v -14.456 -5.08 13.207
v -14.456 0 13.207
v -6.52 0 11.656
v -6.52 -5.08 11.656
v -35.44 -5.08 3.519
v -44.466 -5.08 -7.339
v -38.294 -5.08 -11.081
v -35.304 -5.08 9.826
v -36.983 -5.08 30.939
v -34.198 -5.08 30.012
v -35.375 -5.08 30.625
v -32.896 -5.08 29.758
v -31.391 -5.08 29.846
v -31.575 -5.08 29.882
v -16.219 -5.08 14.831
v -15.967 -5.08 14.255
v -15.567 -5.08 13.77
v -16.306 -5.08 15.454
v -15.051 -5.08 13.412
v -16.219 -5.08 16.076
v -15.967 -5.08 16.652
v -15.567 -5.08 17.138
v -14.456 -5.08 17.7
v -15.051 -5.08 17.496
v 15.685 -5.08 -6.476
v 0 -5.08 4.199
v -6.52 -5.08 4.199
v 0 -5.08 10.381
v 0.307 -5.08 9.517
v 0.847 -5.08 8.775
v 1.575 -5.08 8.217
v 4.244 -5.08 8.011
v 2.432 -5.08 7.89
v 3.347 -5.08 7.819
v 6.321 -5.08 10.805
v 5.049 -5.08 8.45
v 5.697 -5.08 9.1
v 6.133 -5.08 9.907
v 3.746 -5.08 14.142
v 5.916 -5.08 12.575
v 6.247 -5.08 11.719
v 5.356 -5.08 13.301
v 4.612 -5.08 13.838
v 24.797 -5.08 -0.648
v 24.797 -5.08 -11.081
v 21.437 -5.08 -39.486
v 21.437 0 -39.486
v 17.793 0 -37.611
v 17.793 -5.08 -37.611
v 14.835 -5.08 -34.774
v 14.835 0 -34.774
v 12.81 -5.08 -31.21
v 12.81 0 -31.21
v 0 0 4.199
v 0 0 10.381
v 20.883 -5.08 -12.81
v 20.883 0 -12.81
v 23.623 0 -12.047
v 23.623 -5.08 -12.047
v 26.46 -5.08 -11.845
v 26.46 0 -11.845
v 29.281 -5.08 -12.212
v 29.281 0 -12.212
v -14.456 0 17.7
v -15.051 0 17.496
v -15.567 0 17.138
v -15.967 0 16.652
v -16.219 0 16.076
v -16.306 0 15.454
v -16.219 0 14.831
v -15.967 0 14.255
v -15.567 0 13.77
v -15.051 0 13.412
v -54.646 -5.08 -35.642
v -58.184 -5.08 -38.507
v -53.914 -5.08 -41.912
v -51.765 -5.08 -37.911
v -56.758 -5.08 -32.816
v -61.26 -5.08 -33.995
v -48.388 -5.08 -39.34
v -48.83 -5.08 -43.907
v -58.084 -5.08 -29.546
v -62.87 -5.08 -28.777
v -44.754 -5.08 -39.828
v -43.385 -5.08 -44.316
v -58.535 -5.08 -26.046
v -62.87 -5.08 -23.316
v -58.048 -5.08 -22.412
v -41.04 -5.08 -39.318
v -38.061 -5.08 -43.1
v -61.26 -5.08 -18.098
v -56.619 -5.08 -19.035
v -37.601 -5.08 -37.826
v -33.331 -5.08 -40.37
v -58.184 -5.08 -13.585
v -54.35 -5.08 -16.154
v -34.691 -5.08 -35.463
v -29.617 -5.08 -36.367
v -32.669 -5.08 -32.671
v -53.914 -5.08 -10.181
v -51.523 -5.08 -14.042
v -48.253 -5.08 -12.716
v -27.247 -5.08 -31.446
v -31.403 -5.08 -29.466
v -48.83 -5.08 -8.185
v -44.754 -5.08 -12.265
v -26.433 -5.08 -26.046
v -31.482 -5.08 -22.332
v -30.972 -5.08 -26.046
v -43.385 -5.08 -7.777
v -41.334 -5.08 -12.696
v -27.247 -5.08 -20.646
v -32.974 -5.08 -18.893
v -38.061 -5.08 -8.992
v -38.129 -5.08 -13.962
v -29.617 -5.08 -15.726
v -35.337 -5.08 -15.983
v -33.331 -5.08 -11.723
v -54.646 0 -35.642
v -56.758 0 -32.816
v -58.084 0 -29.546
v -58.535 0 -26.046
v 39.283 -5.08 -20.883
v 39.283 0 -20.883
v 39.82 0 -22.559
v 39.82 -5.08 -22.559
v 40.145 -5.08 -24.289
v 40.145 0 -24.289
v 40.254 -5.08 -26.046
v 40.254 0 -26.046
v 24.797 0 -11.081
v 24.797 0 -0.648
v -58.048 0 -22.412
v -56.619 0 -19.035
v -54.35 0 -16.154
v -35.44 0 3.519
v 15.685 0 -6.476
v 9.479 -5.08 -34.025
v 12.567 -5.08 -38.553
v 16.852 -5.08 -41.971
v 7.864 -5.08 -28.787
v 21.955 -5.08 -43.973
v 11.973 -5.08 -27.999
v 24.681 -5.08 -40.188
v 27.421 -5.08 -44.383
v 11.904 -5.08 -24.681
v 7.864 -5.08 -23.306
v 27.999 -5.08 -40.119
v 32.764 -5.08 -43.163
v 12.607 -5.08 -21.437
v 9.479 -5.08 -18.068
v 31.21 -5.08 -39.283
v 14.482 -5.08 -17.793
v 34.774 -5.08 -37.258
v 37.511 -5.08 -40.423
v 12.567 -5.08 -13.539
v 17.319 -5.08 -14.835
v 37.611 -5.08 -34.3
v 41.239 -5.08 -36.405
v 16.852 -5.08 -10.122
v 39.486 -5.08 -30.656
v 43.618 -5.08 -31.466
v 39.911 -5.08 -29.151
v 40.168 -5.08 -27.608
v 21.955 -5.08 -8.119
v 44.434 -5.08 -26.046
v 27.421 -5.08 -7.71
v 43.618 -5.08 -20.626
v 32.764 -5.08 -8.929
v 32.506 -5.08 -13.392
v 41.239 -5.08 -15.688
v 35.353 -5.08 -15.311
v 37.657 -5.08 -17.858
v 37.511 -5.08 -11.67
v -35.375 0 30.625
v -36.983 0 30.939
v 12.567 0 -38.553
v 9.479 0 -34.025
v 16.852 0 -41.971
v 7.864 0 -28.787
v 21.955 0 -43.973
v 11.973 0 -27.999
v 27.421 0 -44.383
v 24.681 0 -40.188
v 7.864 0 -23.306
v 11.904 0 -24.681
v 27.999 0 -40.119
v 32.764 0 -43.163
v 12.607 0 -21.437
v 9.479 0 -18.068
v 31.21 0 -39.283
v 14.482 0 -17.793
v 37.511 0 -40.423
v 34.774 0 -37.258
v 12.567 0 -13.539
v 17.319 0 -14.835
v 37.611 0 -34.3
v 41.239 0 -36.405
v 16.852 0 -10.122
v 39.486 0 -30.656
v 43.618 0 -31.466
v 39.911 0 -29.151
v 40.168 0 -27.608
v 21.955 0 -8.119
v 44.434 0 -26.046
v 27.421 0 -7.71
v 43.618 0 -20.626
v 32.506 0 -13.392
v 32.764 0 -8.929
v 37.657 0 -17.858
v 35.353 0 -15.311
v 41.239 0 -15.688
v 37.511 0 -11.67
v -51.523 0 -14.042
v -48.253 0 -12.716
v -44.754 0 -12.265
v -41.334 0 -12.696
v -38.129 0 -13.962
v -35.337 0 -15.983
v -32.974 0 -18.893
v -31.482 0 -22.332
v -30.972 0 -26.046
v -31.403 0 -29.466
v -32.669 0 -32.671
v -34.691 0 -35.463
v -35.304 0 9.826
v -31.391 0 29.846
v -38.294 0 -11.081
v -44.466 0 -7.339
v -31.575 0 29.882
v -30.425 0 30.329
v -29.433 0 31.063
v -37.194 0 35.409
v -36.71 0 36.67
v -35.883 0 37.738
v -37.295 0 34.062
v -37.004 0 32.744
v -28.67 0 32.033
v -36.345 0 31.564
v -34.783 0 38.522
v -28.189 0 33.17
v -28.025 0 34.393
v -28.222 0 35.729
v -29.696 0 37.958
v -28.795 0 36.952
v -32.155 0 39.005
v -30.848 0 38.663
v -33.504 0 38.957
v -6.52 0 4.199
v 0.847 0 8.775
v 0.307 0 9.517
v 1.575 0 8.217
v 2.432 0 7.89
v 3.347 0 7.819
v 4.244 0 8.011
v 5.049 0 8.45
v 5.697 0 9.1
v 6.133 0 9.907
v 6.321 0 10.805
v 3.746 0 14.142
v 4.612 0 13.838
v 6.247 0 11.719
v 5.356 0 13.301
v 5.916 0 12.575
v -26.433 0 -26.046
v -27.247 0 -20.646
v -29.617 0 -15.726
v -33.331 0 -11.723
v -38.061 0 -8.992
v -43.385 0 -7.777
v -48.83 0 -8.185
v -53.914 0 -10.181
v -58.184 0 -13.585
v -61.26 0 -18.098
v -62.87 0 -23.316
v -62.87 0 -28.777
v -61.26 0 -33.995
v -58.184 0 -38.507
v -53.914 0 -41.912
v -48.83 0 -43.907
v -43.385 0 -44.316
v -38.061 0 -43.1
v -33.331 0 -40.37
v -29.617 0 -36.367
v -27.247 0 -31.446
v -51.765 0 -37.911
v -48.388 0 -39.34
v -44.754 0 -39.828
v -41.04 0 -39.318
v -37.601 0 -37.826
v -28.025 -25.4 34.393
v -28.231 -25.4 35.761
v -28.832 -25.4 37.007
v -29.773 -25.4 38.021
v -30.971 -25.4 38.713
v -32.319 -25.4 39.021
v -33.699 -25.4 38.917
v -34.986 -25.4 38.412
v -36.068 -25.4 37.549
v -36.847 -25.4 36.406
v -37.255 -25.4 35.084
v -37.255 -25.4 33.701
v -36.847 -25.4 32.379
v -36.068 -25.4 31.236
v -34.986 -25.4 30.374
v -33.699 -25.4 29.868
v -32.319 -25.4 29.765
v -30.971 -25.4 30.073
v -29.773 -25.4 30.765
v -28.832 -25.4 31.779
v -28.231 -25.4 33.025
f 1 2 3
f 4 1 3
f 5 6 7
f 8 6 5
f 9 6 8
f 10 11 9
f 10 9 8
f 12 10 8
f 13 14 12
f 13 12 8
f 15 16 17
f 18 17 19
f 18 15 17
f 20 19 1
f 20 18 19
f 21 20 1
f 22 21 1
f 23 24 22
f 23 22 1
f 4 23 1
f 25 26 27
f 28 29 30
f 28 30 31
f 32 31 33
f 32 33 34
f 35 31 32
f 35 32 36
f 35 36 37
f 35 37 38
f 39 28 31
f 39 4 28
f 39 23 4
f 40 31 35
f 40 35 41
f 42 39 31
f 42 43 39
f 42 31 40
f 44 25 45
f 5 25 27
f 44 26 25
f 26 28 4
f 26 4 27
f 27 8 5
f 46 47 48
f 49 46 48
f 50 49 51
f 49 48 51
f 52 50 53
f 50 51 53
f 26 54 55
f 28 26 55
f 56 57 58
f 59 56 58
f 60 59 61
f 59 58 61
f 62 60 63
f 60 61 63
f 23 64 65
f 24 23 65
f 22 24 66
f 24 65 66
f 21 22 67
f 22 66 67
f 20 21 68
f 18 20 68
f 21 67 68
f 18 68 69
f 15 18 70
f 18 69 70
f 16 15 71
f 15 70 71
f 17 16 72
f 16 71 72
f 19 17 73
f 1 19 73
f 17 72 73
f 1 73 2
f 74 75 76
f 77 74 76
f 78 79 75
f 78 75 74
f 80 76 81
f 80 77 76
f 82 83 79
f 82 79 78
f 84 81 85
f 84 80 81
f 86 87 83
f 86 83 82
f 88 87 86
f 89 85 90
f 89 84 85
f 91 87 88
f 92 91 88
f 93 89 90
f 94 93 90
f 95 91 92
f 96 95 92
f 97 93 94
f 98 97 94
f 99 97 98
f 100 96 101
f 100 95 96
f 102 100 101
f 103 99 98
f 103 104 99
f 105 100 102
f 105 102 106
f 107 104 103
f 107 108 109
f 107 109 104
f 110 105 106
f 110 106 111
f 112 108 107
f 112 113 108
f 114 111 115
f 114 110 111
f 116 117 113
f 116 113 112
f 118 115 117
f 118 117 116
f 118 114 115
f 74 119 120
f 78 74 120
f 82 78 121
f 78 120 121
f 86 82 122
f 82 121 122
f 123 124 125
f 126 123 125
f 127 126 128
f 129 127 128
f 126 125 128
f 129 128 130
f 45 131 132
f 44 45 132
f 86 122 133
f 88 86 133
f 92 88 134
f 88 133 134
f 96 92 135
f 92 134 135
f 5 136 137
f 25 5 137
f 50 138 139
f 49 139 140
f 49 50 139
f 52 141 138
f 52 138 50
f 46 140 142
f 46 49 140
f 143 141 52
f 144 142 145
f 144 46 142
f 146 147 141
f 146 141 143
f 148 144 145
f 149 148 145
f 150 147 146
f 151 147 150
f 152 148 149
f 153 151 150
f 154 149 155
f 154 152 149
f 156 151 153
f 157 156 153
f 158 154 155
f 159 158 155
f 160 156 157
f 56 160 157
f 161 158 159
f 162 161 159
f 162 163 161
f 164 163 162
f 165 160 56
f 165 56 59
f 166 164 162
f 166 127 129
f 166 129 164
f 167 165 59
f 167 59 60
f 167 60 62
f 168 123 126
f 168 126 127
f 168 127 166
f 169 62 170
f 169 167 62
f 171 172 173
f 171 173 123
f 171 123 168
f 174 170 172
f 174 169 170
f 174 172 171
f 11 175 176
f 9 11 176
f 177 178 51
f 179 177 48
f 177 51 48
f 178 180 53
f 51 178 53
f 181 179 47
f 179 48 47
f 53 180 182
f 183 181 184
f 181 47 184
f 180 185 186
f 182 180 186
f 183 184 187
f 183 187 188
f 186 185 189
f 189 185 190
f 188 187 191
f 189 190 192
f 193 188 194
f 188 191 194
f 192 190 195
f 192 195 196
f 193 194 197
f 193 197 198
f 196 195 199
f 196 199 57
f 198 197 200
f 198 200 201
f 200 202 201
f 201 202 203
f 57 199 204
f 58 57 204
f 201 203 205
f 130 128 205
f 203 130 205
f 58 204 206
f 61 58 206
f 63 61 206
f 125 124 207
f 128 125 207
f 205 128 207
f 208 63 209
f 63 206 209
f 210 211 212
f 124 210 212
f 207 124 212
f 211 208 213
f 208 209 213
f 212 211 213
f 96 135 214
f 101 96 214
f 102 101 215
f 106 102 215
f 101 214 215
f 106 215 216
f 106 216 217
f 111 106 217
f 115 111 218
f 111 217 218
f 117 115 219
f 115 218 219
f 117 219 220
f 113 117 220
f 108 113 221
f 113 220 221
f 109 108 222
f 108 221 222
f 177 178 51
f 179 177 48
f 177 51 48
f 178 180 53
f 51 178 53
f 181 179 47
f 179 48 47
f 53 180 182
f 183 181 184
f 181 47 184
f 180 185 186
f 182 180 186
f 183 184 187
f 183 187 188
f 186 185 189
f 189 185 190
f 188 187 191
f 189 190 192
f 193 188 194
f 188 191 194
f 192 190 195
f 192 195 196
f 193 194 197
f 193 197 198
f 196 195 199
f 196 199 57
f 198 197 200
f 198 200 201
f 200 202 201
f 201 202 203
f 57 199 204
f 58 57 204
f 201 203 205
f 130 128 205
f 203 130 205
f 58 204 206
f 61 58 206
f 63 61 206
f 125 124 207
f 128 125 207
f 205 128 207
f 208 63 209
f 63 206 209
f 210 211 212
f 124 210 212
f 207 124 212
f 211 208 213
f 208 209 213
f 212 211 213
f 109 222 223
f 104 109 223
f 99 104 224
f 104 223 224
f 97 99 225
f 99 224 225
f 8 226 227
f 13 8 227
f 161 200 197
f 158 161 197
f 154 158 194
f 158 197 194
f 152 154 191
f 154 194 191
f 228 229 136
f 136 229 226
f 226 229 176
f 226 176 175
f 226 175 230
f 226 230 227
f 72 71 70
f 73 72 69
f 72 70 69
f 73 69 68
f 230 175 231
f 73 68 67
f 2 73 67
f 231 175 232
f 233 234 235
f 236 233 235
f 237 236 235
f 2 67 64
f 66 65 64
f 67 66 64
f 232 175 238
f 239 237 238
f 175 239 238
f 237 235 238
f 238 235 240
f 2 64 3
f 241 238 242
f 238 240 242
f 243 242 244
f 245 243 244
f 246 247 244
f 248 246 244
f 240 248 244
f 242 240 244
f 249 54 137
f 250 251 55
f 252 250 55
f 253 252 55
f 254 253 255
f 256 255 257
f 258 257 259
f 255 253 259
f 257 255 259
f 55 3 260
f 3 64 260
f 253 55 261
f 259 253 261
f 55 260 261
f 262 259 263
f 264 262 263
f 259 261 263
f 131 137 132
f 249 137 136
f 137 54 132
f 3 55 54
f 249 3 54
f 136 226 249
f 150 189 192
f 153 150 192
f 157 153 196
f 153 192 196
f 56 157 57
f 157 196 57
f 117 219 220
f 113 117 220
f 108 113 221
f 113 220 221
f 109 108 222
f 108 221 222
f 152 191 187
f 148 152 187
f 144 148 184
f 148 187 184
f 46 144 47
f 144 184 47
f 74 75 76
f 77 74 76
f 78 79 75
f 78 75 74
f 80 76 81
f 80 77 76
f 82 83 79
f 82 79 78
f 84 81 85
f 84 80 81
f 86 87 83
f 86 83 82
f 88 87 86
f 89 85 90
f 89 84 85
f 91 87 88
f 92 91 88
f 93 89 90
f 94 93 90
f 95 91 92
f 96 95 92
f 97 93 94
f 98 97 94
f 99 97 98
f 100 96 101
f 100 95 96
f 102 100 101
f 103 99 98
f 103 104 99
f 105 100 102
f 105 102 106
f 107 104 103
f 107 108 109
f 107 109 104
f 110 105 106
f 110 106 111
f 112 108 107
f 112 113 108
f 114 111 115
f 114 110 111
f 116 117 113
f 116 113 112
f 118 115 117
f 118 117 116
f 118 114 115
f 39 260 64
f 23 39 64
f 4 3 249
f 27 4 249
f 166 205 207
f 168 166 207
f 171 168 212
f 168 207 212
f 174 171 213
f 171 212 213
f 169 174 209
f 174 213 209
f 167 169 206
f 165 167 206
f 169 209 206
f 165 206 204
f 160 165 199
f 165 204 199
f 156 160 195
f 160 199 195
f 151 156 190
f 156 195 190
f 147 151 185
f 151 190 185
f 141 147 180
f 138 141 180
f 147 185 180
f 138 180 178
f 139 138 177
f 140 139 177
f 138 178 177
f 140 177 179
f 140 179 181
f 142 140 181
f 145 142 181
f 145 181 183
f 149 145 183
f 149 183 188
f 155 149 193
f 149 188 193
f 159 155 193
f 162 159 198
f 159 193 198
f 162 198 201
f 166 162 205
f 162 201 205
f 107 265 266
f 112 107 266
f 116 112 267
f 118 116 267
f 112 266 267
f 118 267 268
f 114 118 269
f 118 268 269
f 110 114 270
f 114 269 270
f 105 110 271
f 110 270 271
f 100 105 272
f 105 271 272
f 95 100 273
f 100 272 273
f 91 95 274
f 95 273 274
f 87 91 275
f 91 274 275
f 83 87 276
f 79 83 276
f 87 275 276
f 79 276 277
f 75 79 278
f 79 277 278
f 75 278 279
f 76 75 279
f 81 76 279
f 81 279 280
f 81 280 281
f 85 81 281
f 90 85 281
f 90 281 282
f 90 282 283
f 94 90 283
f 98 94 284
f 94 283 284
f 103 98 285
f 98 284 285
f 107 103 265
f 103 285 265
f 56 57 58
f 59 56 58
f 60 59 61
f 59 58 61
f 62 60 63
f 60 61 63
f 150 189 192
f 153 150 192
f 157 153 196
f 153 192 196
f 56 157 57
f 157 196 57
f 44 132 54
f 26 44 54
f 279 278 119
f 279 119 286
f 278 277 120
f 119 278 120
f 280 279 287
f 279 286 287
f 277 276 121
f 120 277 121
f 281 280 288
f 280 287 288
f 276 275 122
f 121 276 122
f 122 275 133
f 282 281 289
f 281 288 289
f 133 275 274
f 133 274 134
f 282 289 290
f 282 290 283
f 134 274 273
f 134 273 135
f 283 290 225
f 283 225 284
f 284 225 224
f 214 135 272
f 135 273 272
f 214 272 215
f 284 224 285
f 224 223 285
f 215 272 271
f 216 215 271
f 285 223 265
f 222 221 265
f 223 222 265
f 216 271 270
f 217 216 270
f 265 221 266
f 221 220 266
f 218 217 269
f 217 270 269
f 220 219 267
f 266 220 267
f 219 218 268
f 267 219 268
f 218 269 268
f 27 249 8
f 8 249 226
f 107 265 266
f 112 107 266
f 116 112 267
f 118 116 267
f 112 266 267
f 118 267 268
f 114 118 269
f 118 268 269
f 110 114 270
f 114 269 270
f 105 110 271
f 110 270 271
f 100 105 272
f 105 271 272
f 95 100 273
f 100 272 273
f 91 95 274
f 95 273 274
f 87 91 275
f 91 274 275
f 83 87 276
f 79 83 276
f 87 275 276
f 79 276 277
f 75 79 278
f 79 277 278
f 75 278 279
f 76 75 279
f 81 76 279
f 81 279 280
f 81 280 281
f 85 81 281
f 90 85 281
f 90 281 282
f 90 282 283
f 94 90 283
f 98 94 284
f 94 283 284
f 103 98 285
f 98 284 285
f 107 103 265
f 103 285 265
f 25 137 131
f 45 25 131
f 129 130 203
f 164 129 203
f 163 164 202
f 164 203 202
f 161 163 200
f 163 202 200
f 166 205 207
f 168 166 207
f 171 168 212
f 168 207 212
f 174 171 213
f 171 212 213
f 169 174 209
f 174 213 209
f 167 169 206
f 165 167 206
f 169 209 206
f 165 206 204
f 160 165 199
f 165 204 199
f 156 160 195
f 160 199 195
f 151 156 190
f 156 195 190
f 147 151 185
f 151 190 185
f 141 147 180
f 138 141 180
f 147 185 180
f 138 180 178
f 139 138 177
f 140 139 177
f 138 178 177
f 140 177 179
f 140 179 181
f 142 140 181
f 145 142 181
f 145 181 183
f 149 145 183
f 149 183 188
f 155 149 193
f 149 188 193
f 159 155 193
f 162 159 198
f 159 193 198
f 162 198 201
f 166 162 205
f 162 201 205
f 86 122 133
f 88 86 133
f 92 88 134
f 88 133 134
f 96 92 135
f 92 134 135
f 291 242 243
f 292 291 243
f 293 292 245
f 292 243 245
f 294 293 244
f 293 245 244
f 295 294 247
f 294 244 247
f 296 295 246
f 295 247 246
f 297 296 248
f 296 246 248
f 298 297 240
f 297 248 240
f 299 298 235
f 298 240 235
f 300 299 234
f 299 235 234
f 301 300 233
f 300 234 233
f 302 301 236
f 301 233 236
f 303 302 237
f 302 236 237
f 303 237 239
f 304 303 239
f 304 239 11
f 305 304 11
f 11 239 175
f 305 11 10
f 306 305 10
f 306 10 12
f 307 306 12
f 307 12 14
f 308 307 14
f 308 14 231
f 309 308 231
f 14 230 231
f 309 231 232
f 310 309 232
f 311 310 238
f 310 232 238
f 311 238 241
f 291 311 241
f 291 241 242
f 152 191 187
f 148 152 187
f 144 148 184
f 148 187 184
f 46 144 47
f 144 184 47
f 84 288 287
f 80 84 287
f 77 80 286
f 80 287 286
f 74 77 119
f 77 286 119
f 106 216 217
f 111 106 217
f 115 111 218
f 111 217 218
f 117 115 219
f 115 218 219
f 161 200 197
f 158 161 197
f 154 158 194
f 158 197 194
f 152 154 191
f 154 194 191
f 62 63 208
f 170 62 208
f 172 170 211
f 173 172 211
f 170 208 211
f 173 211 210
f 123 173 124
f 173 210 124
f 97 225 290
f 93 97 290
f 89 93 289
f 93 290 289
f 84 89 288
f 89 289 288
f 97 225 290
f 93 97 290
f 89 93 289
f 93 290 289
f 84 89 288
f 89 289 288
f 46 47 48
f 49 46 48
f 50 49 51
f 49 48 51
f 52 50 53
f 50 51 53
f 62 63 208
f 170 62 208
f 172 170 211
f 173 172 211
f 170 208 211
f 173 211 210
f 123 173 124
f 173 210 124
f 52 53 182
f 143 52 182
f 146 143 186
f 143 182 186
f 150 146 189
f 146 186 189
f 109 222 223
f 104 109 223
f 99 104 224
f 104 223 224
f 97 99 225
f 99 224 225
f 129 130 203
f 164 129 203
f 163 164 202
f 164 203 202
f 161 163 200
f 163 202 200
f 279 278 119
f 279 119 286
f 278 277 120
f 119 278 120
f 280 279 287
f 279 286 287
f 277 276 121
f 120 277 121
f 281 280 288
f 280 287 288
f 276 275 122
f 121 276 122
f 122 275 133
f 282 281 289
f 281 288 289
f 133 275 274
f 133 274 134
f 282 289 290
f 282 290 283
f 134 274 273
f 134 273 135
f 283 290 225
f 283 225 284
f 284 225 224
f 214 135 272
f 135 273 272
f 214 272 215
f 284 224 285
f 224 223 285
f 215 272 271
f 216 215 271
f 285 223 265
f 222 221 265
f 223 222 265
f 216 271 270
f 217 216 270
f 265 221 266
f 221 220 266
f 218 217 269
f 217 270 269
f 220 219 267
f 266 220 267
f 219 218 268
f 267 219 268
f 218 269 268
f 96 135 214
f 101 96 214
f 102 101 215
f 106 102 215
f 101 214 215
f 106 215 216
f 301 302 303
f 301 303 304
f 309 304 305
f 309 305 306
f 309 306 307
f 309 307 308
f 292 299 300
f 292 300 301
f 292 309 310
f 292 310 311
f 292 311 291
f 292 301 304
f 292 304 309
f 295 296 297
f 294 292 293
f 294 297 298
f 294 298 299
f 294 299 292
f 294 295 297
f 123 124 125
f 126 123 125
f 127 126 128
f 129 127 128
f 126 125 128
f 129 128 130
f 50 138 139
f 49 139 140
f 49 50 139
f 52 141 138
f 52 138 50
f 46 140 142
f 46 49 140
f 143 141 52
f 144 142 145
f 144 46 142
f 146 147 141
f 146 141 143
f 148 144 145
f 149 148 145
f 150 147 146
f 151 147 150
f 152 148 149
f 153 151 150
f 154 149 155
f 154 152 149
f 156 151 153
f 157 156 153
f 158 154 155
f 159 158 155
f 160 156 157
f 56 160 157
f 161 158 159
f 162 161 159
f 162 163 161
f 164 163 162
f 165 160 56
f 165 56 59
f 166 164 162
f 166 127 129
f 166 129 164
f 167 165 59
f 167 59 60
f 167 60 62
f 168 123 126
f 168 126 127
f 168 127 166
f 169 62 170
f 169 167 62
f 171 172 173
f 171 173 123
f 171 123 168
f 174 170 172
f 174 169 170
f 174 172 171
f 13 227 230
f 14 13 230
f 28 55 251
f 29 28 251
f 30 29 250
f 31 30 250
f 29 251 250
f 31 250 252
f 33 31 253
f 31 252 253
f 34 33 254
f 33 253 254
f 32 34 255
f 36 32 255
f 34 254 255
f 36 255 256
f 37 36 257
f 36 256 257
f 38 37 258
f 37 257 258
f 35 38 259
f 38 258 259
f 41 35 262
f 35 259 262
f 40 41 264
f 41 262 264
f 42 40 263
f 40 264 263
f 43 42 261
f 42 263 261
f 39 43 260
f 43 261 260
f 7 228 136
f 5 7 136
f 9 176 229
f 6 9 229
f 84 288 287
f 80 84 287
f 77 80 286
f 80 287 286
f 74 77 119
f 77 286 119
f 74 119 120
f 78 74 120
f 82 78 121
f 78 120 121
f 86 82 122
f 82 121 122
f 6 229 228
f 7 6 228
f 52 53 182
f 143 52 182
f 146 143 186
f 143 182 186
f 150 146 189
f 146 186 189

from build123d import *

# Parameters (mm, degrees)
F0_R     = 18.320369
F0_R_2   = 18.388064
F1_DEPTH = 5.08
F2_DEPTH = 5.08
F4_DEPTH = 5.08
F5_R     = 4.640729
F6_DEPTH = 25.4


with BuildPart() as f1:
    # F0 (on Front) → F1 (new body)
    with BuildSketch(Plane.XZ):
        with Locations((-44.753797, -26.046421)):
            Circle(F0_R)
        with BuildLine():
            ThreePointArc((-35.337483, -15.98326), (-32.110486, -20.561819), (-30.972136, -26.046421))
            ThreePointArc((-30.972136, -26.046421), (-31.935427, -31.108393), (-34.690636, -35.462736))
            ThreePointArc((-34.690636, -35.462736), (-39.269195, -38.689733), (-44.753797, -39.828083))
            ThreePointArc((-44.753797, -39.828083), (-50.124491, -38.738538), (-54.645997, -35.642179))
            ThreePointArc((-54.645997, -35.642179), (-57.526133, -31.22345), (-58.535458, -26.046421))
            ThreePointArc((-58.535458, -26.046421), (-57.445914, -20.675728), (-54.349555, -16.154222))
            ThreePointArc((-54.349555, -16.154222), (-49.930826, -13.274086), (-44.753797, -12.26476))
            ThreePointArc((-44.753797, -12.26476), (-39.691826, -13.228051), (-35.337483, -15.98326))
        make_face(mode=Mode.SUBTRACT)
        with Locations((26.04642, -26.046421)):
            Circle(F0_R_2)
        with BuildLine():
            ThreePointArc((39.282633, -20.882642), (40.00922, -23.419226), (40.254233, -26.046421))
            ThreePointArc((40.254233, -26.046421), (40.060798, -28.382903), (39.485762, -30.655763))
            ThreePointArc((39.485762, -30.655763), (36.299457, -35.881928), (31.210199, -39.282635))
            ThreePointArc((31.210199, -39.282635), (26.341658, -40.251167), (21.437078, -39.485764))
            ThreePointArc((21.437078, -39.485764), (16.210913, -36.299458), (12.810206, -31.210201))
            ThreePointArc((12.810206, -31.210201), (11.841674, -26.34166), (12.607077, -21.43708))
            ThreePointArc((12.607077, -21.43708), (15.793382, -16.210915), (20.88264, -12.810208))
            ThreePointArc((20.88264, -12.810208), (25.03631, -11.874561), (29.280694, -12.211631))
            ThreePointArc((29.280694, -12.211631), (35.353183, -15.311147), (39.282633, -20.882642))
        make_face(mode=Mode.SUBTRACT)
    extrude(amount=F1_DEPTH)


with BuildPart() as f2:
    # F0 (on Front) → F2 (new body)
    with BuildSketch(Plane.XZ):
        with Locations((-44.753797, -26.046421)):
            Circle(F0_R)
        with BuildLine():
            ThreePointArc((-35.337483, -15.98326), (-32.110486, -20.561819), (-30.972136, -26.046421))
            ThreePointArc((-30.972136, -26.046421), (-31.935427, -31.108393), (-34.690636, -35.462736))
            ThreePointArc((-34.690636, -35.462736), (-39.269195, -38.689733), (-44.753797, -39.828083))
            ThreePointArc((-44.753797, -39.828083), (-50.124491, -38.738538), (-54.645997, -35.642179))
            ThreePointArc((-54.645997, -35.642179), (-57.526133, -31.22345), (-58.535458, -26.046421))
            ThreePointArc((-58.535458, -26.046421), (-57.445914, -20.675728), (-54.349555, -16.154222))
            ThreePointArc((-54.349555, -16.154222), (-49.930826, -13.274086), (-44.753797, -12.26476))
            ThreePointArc((-44.753797, -12.26476), (-39.691826, -13.228051), (-35.337483, -15.98326))
        make_face(mode=Mode.SUBTRACT)
        with Locations((26.04642, -26.046421)):
            Circle(F0_R_2)
        with BuildLine():
            ThreePointArc((39.282633, -20.882642), (40.00922, -23.419226), (40.254233, -26.046421))
            ThreePointArc((40.254233, -26.046421), (40.060798, -28.382903), (39.485762, -30.655763))
            ThreePointArc((39.485762, -30.655763), (36.299457, -35.881928), (31.210199, -39.282635))
            ThreePointArc((31.210199, -39.282635), (26.341658, -40.251167), (21.437078, -39.485764))
            ThreePointArc((21.437078, -39.485764), (16.210913, -36.299458), (12.810206, -31.210201))
            ThreePointArc((12.810206, -31.210201), (11.841674, -26.34166), (12.607077, -21.43708))
            ThreePointArc((12.607077, -21.43708), (15.793382, -16.210915), (20.88264, -12.810208))
            ThreePointArc((20.88264, -12.810208), (25.03631, -11.874561), (29.280694, -12.211631))
            ThreePointArc((29.280694, -12.211631), (35.353183, -15.311147), (39.282633, -20.882642))
        make_face(mode=Mode.SUBTRACT)
    extrude(amount=F2_DEPTH)


with BuildPart() as f4:
    # F3 (on Front) → F4 (new body)
    with BuildSketch(Plane.XZ):
        Polygon((-36.983039, 30.939119), (-44.465989, -7.339047), (-38.294397, -11.080521), (-35.440378, 3.518886), (15.685415, -6.47563), (24.796607, -11.080521), (24.796607, -6.47563), (24.796607, -0.648227), (0, 4.19923), (0, 10.381487), (-6.520308, 11.656133), (-6.520308, 4.19923), (-35.304489, 9.826213), (-31.390863, 29.845912), align=None)
        with BuildLine():
            Line((-14.455974, 13.207467), (-6.520308, 11.656133))
            Line((-6.520308, 11.656133), (0, 10.381487))
            ThreePointArc((0, 10.381487), (5.396313, 8.751765), (3.745914, 14.14179))
            Line((3.745914, 14.14179), (-14.455974, 17.700054))
            ThreePointArc((-14.455974, 17.700054), (-16.305662, 15.45376), (-14.455974, 13.207467))
        make_face()
    extrude(amount=F4_DEPTH)

    # F5 (on Front) → F6 (join)
    with BuildSketch(Plane.XZ):
        with Locations((-32.665953, 34.392789)):
            Circle(F5_R)
    extrude(amount=F6_DEPTH)


solid = Compound([f1.part, f2.part, f4.part])
